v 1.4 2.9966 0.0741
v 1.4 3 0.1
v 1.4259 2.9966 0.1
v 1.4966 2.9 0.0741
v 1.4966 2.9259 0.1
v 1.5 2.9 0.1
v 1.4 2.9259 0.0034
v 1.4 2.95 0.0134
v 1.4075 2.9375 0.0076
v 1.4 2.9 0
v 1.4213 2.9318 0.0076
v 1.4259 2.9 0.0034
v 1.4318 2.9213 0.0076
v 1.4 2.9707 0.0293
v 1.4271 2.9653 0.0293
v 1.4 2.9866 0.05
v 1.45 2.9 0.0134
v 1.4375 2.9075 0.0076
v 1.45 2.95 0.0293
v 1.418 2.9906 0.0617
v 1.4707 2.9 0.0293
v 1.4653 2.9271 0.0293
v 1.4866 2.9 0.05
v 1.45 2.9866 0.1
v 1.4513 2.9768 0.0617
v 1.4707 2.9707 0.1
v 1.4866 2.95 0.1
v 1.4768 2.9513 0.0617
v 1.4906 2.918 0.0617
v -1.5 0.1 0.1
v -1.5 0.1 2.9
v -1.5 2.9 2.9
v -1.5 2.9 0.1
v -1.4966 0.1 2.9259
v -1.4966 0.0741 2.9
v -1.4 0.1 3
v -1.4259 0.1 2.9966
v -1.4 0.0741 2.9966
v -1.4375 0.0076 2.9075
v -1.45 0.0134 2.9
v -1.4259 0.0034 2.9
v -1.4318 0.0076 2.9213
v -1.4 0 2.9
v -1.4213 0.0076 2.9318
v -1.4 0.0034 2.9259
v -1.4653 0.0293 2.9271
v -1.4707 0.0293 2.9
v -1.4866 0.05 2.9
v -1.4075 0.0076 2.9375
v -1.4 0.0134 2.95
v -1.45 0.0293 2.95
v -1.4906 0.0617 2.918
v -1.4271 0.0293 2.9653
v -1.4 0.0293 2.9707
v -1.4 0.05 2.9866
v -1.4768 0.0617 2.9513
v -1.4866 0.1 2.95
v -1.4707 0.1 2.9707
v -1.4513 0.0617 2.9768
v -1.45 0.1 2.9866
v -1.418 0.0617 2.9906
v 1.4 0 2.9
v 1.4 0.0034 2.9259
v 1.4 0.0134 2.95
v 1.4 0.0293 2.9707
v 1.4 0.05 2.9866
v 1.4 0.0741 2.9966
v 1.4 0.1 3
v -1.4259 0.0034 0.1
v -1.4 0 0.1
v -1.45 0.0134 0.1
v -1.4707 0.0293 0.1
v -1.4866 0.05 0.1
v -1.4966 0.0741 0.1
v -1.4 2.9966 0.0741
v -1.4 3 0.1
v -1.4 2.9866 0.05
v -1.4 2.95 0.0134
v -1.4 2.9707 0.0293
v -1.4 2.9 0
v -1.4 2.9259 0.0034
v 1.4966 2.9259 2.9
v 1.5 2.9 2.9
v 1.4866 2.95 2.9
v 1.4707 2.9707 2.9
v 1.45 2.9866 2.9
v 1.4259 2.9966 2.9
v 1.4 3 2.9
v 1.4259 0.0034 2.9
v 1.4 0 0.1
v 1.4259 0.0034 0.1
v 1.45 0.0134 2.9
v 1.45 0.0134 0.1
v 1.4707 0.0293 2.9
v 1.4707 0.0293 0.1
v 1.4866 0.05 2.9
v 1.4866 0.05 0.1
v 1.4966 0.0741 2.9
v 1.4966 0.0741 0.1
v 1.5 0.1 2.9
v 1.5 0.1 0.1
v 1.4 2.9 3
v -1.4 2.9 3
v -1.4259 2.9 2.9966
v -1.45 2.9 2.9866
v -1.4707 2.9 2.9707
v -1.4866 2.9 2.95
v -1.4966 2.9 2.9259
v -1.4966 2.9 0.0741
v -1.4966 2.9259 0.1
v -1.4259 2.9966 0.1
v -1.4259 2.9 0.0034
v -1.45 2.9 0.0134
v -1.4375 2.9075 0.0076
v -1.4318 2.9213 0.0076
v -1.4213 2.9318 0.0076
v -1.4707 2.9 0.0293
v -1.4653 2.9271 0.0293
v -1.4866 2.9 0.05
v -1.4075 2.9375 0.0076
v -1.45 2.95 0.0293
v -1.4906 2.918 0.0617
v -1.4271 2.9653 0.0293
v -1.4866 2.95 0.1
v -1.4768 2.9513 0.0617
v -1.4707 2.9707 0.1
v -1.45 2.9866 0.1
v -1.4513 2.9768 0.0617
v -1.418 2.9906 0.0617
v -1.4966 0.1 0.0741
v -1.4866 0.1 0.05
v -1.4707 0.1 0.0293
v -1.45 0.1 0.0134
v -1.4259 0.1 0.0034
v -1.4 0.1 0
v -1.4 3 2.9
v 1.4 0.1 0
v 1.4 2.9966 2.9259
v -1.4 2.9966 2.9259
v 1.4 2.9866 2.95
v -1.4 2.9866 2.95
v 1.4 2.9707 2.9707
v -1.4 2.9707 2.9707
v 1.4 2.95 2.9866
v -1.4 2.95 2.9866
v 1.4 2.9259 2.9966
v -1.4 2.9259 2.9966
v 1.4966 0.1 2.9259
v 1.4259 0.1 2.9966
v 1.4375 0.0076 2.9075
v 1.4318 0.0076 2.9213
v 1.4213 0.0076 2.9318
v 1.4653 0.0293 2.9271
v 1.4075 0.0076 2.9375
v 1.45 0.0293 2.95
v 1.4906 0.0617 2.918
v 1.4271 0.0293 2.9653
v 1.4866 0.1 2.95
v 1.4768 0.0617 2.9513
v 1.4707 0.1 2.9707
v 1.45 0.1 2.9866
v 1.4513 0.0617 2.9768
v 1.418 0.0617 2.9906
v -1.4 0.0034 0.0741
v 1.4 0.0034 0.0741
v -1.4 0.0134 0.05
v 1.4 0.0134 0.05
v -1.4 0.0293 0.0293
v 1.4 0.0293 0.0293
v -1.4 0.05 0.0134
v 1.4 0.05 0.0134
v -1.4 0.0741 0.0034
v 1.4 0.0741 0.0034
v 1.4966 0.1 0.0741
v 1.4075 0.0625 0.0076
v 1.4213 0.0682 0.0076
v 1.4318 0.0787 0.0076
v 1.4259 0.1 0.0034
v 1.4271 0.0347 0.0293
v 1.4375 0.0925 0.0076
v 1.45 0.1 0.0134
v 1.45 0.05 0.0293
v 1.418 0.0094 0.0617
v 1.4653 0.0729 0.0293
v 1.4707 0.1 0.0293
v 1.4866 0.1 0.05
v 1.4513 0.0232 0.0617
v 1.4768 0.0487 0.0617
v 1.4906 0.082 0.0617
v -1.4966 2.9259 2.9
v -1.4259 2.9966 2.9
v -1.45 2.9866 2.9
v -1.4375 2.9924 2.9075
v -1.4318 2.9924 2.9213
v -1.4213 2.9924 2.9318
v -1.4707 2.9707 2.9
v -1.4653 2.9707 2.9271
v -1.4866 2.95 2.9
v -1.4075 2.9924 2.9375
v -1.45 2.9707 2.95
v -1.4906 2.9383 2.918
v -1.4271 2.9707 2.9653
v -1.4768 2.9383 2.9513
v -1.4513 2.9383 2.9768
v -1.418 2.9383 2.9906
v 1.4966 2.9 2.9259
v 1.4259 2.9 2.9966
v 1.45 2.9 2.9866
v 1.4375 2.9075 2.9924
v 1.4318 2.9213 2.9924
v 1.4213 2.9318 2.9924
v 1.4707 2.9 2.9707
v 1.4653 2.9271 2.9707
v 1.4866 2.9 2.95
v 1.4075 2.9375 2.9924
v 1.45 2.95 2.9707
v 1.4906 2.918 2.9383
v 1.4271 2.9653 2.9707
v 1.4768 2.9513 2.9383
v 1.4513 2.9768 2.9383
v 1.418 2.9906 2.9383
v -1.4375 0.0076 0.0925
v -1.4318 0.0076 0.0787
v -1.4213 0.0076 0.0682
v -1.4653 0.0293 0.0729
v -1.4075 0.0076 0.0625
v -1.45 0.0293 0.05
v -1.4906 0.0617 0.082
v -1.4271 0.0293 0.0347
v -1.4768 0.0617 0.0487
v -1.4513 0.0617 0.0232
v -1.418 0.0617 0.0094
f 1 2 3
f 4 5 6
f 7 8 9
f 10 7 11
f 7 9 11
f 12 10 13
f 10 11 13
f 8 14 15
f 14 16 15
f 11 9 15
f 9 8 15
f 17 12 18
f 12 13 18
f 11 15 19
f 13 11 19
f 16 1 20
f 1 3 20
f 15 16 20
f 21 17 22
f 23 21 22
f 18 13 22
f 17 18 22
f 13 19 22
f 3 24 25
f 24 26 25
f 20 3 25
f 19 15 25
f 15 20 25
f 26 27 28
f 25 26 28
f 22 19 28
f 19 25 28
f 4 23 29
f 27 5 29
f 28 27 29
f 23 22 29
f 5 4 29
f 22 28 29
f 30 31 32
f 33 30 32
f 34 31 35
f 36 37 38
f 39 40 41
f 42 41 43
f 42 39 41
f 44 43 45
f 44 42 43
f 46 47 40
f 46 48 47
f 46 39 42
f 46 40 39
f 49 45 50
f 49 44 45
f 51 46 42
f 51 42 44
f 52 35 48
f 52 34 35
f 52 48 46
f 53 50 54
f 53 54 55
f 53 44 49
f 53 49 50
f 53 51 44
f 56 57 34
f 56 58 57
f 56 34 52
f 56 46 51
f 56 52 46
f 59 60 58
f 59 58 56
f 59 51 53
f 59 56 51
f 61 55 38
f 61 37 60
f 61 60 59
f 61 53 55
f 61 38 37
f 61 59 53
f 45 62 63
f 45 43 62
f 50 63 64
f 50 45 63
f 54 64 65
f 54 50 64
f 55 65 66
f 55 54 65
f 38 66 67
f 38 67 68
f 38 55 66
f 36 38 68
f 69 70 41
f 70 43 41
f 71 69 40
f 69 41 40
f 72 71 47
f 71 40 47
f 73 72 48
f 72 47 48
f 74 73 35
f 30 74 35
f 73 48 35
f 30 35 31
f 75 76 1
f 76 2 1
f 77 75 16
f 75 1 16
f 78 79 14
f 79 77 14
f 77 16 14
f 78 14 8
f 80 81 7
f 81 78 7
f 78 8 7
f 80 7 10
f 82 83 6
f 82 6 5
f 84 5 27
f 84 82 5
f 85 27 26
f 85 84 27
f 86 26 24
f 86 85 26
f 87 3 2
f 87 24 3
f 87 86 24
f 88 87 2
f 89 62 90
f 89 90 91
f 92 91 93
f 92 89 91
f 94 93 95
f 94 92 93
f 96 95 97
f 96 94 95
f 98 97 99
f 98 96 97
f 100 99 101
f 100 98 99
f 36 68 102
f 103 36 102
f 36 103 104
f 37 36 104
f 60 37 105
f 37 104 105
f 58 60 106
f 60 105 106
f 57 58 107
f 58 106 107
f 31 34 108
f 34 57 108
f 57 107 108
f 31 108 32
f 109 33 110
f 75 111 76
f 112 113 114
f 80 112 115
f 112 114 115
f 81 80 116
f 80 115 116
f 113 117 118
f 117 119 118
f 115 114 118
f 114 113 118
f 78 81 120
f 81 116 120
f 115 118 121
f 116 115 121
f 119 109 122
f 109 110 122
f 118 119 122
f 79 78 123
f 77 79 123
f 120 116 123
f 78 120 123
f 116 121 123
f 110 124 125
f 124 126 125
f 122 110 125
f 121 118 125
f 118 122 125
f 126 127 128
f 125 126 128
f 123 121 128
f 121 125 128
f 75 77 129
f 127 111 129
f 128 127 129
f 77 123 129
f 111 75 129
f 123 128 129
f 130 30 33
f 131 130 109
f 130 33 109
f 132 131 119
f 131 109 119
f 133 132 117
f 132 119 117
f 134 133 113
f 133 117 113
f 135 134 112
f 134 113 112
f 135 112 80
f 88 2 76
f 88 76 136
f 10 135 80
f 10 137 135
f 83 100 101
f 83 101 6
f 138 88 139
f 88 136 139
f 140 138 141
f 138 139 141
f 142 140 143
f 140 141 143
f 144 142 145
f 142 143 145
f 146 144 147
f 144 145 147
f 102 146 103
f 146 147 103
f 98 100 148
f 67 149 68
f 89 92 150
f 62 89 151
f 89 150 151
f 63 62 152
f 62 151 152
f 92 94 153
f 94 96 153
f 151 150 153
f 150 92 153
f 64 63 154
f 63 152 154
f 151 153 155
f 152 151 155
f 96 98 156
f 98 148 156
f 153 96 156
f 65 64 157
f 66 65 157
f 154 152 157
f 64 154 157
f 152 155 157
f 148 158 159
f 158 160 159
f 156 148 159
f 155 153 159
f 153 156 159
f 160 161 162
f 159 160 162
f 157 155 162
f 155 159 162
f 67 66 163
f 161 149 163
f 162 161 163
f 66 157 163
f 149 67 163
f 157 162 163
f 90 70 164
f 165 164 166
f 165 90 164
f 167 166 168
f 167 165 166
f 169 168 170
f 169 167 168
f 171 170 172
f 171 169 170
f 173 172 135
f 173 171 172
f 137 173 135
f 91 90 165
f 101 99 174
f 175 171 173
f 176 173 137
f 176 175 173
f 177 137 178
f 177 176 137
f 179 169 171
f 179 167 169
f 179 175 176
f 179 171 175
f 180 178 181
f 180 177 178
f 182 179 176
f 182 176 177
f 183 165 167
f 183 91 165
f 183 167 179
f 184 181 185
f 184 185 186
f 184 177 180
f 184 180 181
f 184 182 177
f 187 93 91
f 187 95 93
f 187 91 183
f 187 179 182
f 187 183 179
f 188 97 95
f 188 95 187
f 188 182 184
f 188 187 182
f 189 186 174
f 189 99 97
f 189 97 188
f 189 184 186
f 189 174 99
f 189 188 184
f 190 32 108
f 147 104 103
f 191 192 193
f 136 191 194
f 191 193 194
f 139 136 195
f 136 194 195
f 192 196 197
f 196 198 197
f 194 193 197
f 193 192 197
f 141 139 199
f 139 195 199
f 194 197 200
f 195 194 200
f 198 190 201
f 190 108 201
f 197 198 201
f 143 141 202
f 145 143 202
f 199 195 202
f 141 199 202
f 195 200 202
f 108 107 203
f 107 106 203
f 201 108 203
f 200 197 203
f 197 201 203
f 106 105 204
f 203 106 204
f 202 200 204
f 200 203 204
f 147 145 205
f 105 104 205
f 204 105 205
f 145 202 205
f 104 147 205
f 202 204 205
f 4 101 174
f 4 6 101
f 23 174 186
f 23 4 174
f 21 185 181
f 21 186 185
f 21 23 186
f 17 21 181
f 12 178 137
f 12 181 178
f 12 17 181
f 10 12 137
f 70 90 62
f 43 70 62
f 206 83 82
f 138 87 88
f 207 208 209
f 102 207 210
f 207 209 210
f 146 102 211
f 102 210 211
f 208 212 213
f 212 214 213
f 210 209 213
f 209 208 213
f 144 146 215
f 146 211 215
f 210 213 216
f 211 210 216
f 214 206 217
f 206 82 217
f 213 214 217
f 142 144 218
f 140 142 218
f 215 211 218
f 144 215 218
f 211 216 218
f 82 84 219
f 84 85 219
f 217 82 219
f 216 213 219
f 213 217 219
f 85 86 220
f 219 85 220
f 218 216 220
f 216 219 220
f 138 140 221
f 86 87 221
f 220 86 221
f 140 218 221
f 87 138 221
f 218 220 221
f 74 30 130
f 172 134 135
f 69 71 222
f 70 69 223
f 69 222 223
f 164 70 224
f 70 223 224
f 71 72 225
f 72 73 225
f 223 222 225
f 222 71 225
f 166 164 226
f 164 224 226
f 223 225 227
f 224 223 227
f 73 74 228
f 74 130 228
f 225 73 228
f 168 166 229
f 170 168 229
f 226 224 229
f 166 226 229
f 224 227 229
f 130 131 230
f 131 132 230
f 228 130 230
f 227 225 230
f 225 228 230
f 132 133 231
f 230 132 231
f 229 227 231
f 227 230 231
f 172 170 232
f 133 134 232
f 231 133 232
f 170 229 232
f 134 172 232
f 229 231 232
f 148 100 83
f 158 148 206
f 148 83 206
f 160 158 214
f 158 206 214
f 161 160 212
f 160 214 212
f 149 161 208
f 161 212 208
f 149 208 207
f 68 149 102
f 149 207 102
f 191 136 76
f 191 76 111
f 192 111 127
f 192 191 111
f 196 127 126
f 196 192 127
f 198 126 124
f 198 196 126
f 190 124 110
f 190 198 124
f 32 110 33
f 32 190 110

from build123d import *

# Parameters (mm, degrees)
SKETCH1_W           = 3
SKETCH1_H           = 3
BOSS_EXTRUDE1_DEPTH = 1.5
FILLET1_R           = 0.1


with BuildPart() as part:
    # Sketch1 → Boss-Extrude1 (new body, symmetric)
    with BuildSketch(Plane.YZ):
        with Locations((1.5, 1.5)):
            Rectangle(SKETCH1_W, SKETCH1_H)
    extrude(amount=BOSS_EXTRUDE1_DEPTH, both=True)

    # Fillet1
    fillet1_edges = [part.edges().sort_by_distance(p)[0] for p in [
        (1.5, 3, 1.5),
        (1.5, 1.5, 3),
        (1.5, 0, 1.5),
        (-1.5, 1.5, 3),
        (-1.5, 3, 1.5),
        (-1.5, 1.5, 0),
        (-1.5, 0, 1.5),
        (0, 0, 3),
        (0, 3, 3),
        (0, 3, 0),
        (0, 0, 0),
        (1.5, 1.5, 0),
    ]]
    fillet(fillet1_edges, radius=FILLET1_R)


solid = part.part
